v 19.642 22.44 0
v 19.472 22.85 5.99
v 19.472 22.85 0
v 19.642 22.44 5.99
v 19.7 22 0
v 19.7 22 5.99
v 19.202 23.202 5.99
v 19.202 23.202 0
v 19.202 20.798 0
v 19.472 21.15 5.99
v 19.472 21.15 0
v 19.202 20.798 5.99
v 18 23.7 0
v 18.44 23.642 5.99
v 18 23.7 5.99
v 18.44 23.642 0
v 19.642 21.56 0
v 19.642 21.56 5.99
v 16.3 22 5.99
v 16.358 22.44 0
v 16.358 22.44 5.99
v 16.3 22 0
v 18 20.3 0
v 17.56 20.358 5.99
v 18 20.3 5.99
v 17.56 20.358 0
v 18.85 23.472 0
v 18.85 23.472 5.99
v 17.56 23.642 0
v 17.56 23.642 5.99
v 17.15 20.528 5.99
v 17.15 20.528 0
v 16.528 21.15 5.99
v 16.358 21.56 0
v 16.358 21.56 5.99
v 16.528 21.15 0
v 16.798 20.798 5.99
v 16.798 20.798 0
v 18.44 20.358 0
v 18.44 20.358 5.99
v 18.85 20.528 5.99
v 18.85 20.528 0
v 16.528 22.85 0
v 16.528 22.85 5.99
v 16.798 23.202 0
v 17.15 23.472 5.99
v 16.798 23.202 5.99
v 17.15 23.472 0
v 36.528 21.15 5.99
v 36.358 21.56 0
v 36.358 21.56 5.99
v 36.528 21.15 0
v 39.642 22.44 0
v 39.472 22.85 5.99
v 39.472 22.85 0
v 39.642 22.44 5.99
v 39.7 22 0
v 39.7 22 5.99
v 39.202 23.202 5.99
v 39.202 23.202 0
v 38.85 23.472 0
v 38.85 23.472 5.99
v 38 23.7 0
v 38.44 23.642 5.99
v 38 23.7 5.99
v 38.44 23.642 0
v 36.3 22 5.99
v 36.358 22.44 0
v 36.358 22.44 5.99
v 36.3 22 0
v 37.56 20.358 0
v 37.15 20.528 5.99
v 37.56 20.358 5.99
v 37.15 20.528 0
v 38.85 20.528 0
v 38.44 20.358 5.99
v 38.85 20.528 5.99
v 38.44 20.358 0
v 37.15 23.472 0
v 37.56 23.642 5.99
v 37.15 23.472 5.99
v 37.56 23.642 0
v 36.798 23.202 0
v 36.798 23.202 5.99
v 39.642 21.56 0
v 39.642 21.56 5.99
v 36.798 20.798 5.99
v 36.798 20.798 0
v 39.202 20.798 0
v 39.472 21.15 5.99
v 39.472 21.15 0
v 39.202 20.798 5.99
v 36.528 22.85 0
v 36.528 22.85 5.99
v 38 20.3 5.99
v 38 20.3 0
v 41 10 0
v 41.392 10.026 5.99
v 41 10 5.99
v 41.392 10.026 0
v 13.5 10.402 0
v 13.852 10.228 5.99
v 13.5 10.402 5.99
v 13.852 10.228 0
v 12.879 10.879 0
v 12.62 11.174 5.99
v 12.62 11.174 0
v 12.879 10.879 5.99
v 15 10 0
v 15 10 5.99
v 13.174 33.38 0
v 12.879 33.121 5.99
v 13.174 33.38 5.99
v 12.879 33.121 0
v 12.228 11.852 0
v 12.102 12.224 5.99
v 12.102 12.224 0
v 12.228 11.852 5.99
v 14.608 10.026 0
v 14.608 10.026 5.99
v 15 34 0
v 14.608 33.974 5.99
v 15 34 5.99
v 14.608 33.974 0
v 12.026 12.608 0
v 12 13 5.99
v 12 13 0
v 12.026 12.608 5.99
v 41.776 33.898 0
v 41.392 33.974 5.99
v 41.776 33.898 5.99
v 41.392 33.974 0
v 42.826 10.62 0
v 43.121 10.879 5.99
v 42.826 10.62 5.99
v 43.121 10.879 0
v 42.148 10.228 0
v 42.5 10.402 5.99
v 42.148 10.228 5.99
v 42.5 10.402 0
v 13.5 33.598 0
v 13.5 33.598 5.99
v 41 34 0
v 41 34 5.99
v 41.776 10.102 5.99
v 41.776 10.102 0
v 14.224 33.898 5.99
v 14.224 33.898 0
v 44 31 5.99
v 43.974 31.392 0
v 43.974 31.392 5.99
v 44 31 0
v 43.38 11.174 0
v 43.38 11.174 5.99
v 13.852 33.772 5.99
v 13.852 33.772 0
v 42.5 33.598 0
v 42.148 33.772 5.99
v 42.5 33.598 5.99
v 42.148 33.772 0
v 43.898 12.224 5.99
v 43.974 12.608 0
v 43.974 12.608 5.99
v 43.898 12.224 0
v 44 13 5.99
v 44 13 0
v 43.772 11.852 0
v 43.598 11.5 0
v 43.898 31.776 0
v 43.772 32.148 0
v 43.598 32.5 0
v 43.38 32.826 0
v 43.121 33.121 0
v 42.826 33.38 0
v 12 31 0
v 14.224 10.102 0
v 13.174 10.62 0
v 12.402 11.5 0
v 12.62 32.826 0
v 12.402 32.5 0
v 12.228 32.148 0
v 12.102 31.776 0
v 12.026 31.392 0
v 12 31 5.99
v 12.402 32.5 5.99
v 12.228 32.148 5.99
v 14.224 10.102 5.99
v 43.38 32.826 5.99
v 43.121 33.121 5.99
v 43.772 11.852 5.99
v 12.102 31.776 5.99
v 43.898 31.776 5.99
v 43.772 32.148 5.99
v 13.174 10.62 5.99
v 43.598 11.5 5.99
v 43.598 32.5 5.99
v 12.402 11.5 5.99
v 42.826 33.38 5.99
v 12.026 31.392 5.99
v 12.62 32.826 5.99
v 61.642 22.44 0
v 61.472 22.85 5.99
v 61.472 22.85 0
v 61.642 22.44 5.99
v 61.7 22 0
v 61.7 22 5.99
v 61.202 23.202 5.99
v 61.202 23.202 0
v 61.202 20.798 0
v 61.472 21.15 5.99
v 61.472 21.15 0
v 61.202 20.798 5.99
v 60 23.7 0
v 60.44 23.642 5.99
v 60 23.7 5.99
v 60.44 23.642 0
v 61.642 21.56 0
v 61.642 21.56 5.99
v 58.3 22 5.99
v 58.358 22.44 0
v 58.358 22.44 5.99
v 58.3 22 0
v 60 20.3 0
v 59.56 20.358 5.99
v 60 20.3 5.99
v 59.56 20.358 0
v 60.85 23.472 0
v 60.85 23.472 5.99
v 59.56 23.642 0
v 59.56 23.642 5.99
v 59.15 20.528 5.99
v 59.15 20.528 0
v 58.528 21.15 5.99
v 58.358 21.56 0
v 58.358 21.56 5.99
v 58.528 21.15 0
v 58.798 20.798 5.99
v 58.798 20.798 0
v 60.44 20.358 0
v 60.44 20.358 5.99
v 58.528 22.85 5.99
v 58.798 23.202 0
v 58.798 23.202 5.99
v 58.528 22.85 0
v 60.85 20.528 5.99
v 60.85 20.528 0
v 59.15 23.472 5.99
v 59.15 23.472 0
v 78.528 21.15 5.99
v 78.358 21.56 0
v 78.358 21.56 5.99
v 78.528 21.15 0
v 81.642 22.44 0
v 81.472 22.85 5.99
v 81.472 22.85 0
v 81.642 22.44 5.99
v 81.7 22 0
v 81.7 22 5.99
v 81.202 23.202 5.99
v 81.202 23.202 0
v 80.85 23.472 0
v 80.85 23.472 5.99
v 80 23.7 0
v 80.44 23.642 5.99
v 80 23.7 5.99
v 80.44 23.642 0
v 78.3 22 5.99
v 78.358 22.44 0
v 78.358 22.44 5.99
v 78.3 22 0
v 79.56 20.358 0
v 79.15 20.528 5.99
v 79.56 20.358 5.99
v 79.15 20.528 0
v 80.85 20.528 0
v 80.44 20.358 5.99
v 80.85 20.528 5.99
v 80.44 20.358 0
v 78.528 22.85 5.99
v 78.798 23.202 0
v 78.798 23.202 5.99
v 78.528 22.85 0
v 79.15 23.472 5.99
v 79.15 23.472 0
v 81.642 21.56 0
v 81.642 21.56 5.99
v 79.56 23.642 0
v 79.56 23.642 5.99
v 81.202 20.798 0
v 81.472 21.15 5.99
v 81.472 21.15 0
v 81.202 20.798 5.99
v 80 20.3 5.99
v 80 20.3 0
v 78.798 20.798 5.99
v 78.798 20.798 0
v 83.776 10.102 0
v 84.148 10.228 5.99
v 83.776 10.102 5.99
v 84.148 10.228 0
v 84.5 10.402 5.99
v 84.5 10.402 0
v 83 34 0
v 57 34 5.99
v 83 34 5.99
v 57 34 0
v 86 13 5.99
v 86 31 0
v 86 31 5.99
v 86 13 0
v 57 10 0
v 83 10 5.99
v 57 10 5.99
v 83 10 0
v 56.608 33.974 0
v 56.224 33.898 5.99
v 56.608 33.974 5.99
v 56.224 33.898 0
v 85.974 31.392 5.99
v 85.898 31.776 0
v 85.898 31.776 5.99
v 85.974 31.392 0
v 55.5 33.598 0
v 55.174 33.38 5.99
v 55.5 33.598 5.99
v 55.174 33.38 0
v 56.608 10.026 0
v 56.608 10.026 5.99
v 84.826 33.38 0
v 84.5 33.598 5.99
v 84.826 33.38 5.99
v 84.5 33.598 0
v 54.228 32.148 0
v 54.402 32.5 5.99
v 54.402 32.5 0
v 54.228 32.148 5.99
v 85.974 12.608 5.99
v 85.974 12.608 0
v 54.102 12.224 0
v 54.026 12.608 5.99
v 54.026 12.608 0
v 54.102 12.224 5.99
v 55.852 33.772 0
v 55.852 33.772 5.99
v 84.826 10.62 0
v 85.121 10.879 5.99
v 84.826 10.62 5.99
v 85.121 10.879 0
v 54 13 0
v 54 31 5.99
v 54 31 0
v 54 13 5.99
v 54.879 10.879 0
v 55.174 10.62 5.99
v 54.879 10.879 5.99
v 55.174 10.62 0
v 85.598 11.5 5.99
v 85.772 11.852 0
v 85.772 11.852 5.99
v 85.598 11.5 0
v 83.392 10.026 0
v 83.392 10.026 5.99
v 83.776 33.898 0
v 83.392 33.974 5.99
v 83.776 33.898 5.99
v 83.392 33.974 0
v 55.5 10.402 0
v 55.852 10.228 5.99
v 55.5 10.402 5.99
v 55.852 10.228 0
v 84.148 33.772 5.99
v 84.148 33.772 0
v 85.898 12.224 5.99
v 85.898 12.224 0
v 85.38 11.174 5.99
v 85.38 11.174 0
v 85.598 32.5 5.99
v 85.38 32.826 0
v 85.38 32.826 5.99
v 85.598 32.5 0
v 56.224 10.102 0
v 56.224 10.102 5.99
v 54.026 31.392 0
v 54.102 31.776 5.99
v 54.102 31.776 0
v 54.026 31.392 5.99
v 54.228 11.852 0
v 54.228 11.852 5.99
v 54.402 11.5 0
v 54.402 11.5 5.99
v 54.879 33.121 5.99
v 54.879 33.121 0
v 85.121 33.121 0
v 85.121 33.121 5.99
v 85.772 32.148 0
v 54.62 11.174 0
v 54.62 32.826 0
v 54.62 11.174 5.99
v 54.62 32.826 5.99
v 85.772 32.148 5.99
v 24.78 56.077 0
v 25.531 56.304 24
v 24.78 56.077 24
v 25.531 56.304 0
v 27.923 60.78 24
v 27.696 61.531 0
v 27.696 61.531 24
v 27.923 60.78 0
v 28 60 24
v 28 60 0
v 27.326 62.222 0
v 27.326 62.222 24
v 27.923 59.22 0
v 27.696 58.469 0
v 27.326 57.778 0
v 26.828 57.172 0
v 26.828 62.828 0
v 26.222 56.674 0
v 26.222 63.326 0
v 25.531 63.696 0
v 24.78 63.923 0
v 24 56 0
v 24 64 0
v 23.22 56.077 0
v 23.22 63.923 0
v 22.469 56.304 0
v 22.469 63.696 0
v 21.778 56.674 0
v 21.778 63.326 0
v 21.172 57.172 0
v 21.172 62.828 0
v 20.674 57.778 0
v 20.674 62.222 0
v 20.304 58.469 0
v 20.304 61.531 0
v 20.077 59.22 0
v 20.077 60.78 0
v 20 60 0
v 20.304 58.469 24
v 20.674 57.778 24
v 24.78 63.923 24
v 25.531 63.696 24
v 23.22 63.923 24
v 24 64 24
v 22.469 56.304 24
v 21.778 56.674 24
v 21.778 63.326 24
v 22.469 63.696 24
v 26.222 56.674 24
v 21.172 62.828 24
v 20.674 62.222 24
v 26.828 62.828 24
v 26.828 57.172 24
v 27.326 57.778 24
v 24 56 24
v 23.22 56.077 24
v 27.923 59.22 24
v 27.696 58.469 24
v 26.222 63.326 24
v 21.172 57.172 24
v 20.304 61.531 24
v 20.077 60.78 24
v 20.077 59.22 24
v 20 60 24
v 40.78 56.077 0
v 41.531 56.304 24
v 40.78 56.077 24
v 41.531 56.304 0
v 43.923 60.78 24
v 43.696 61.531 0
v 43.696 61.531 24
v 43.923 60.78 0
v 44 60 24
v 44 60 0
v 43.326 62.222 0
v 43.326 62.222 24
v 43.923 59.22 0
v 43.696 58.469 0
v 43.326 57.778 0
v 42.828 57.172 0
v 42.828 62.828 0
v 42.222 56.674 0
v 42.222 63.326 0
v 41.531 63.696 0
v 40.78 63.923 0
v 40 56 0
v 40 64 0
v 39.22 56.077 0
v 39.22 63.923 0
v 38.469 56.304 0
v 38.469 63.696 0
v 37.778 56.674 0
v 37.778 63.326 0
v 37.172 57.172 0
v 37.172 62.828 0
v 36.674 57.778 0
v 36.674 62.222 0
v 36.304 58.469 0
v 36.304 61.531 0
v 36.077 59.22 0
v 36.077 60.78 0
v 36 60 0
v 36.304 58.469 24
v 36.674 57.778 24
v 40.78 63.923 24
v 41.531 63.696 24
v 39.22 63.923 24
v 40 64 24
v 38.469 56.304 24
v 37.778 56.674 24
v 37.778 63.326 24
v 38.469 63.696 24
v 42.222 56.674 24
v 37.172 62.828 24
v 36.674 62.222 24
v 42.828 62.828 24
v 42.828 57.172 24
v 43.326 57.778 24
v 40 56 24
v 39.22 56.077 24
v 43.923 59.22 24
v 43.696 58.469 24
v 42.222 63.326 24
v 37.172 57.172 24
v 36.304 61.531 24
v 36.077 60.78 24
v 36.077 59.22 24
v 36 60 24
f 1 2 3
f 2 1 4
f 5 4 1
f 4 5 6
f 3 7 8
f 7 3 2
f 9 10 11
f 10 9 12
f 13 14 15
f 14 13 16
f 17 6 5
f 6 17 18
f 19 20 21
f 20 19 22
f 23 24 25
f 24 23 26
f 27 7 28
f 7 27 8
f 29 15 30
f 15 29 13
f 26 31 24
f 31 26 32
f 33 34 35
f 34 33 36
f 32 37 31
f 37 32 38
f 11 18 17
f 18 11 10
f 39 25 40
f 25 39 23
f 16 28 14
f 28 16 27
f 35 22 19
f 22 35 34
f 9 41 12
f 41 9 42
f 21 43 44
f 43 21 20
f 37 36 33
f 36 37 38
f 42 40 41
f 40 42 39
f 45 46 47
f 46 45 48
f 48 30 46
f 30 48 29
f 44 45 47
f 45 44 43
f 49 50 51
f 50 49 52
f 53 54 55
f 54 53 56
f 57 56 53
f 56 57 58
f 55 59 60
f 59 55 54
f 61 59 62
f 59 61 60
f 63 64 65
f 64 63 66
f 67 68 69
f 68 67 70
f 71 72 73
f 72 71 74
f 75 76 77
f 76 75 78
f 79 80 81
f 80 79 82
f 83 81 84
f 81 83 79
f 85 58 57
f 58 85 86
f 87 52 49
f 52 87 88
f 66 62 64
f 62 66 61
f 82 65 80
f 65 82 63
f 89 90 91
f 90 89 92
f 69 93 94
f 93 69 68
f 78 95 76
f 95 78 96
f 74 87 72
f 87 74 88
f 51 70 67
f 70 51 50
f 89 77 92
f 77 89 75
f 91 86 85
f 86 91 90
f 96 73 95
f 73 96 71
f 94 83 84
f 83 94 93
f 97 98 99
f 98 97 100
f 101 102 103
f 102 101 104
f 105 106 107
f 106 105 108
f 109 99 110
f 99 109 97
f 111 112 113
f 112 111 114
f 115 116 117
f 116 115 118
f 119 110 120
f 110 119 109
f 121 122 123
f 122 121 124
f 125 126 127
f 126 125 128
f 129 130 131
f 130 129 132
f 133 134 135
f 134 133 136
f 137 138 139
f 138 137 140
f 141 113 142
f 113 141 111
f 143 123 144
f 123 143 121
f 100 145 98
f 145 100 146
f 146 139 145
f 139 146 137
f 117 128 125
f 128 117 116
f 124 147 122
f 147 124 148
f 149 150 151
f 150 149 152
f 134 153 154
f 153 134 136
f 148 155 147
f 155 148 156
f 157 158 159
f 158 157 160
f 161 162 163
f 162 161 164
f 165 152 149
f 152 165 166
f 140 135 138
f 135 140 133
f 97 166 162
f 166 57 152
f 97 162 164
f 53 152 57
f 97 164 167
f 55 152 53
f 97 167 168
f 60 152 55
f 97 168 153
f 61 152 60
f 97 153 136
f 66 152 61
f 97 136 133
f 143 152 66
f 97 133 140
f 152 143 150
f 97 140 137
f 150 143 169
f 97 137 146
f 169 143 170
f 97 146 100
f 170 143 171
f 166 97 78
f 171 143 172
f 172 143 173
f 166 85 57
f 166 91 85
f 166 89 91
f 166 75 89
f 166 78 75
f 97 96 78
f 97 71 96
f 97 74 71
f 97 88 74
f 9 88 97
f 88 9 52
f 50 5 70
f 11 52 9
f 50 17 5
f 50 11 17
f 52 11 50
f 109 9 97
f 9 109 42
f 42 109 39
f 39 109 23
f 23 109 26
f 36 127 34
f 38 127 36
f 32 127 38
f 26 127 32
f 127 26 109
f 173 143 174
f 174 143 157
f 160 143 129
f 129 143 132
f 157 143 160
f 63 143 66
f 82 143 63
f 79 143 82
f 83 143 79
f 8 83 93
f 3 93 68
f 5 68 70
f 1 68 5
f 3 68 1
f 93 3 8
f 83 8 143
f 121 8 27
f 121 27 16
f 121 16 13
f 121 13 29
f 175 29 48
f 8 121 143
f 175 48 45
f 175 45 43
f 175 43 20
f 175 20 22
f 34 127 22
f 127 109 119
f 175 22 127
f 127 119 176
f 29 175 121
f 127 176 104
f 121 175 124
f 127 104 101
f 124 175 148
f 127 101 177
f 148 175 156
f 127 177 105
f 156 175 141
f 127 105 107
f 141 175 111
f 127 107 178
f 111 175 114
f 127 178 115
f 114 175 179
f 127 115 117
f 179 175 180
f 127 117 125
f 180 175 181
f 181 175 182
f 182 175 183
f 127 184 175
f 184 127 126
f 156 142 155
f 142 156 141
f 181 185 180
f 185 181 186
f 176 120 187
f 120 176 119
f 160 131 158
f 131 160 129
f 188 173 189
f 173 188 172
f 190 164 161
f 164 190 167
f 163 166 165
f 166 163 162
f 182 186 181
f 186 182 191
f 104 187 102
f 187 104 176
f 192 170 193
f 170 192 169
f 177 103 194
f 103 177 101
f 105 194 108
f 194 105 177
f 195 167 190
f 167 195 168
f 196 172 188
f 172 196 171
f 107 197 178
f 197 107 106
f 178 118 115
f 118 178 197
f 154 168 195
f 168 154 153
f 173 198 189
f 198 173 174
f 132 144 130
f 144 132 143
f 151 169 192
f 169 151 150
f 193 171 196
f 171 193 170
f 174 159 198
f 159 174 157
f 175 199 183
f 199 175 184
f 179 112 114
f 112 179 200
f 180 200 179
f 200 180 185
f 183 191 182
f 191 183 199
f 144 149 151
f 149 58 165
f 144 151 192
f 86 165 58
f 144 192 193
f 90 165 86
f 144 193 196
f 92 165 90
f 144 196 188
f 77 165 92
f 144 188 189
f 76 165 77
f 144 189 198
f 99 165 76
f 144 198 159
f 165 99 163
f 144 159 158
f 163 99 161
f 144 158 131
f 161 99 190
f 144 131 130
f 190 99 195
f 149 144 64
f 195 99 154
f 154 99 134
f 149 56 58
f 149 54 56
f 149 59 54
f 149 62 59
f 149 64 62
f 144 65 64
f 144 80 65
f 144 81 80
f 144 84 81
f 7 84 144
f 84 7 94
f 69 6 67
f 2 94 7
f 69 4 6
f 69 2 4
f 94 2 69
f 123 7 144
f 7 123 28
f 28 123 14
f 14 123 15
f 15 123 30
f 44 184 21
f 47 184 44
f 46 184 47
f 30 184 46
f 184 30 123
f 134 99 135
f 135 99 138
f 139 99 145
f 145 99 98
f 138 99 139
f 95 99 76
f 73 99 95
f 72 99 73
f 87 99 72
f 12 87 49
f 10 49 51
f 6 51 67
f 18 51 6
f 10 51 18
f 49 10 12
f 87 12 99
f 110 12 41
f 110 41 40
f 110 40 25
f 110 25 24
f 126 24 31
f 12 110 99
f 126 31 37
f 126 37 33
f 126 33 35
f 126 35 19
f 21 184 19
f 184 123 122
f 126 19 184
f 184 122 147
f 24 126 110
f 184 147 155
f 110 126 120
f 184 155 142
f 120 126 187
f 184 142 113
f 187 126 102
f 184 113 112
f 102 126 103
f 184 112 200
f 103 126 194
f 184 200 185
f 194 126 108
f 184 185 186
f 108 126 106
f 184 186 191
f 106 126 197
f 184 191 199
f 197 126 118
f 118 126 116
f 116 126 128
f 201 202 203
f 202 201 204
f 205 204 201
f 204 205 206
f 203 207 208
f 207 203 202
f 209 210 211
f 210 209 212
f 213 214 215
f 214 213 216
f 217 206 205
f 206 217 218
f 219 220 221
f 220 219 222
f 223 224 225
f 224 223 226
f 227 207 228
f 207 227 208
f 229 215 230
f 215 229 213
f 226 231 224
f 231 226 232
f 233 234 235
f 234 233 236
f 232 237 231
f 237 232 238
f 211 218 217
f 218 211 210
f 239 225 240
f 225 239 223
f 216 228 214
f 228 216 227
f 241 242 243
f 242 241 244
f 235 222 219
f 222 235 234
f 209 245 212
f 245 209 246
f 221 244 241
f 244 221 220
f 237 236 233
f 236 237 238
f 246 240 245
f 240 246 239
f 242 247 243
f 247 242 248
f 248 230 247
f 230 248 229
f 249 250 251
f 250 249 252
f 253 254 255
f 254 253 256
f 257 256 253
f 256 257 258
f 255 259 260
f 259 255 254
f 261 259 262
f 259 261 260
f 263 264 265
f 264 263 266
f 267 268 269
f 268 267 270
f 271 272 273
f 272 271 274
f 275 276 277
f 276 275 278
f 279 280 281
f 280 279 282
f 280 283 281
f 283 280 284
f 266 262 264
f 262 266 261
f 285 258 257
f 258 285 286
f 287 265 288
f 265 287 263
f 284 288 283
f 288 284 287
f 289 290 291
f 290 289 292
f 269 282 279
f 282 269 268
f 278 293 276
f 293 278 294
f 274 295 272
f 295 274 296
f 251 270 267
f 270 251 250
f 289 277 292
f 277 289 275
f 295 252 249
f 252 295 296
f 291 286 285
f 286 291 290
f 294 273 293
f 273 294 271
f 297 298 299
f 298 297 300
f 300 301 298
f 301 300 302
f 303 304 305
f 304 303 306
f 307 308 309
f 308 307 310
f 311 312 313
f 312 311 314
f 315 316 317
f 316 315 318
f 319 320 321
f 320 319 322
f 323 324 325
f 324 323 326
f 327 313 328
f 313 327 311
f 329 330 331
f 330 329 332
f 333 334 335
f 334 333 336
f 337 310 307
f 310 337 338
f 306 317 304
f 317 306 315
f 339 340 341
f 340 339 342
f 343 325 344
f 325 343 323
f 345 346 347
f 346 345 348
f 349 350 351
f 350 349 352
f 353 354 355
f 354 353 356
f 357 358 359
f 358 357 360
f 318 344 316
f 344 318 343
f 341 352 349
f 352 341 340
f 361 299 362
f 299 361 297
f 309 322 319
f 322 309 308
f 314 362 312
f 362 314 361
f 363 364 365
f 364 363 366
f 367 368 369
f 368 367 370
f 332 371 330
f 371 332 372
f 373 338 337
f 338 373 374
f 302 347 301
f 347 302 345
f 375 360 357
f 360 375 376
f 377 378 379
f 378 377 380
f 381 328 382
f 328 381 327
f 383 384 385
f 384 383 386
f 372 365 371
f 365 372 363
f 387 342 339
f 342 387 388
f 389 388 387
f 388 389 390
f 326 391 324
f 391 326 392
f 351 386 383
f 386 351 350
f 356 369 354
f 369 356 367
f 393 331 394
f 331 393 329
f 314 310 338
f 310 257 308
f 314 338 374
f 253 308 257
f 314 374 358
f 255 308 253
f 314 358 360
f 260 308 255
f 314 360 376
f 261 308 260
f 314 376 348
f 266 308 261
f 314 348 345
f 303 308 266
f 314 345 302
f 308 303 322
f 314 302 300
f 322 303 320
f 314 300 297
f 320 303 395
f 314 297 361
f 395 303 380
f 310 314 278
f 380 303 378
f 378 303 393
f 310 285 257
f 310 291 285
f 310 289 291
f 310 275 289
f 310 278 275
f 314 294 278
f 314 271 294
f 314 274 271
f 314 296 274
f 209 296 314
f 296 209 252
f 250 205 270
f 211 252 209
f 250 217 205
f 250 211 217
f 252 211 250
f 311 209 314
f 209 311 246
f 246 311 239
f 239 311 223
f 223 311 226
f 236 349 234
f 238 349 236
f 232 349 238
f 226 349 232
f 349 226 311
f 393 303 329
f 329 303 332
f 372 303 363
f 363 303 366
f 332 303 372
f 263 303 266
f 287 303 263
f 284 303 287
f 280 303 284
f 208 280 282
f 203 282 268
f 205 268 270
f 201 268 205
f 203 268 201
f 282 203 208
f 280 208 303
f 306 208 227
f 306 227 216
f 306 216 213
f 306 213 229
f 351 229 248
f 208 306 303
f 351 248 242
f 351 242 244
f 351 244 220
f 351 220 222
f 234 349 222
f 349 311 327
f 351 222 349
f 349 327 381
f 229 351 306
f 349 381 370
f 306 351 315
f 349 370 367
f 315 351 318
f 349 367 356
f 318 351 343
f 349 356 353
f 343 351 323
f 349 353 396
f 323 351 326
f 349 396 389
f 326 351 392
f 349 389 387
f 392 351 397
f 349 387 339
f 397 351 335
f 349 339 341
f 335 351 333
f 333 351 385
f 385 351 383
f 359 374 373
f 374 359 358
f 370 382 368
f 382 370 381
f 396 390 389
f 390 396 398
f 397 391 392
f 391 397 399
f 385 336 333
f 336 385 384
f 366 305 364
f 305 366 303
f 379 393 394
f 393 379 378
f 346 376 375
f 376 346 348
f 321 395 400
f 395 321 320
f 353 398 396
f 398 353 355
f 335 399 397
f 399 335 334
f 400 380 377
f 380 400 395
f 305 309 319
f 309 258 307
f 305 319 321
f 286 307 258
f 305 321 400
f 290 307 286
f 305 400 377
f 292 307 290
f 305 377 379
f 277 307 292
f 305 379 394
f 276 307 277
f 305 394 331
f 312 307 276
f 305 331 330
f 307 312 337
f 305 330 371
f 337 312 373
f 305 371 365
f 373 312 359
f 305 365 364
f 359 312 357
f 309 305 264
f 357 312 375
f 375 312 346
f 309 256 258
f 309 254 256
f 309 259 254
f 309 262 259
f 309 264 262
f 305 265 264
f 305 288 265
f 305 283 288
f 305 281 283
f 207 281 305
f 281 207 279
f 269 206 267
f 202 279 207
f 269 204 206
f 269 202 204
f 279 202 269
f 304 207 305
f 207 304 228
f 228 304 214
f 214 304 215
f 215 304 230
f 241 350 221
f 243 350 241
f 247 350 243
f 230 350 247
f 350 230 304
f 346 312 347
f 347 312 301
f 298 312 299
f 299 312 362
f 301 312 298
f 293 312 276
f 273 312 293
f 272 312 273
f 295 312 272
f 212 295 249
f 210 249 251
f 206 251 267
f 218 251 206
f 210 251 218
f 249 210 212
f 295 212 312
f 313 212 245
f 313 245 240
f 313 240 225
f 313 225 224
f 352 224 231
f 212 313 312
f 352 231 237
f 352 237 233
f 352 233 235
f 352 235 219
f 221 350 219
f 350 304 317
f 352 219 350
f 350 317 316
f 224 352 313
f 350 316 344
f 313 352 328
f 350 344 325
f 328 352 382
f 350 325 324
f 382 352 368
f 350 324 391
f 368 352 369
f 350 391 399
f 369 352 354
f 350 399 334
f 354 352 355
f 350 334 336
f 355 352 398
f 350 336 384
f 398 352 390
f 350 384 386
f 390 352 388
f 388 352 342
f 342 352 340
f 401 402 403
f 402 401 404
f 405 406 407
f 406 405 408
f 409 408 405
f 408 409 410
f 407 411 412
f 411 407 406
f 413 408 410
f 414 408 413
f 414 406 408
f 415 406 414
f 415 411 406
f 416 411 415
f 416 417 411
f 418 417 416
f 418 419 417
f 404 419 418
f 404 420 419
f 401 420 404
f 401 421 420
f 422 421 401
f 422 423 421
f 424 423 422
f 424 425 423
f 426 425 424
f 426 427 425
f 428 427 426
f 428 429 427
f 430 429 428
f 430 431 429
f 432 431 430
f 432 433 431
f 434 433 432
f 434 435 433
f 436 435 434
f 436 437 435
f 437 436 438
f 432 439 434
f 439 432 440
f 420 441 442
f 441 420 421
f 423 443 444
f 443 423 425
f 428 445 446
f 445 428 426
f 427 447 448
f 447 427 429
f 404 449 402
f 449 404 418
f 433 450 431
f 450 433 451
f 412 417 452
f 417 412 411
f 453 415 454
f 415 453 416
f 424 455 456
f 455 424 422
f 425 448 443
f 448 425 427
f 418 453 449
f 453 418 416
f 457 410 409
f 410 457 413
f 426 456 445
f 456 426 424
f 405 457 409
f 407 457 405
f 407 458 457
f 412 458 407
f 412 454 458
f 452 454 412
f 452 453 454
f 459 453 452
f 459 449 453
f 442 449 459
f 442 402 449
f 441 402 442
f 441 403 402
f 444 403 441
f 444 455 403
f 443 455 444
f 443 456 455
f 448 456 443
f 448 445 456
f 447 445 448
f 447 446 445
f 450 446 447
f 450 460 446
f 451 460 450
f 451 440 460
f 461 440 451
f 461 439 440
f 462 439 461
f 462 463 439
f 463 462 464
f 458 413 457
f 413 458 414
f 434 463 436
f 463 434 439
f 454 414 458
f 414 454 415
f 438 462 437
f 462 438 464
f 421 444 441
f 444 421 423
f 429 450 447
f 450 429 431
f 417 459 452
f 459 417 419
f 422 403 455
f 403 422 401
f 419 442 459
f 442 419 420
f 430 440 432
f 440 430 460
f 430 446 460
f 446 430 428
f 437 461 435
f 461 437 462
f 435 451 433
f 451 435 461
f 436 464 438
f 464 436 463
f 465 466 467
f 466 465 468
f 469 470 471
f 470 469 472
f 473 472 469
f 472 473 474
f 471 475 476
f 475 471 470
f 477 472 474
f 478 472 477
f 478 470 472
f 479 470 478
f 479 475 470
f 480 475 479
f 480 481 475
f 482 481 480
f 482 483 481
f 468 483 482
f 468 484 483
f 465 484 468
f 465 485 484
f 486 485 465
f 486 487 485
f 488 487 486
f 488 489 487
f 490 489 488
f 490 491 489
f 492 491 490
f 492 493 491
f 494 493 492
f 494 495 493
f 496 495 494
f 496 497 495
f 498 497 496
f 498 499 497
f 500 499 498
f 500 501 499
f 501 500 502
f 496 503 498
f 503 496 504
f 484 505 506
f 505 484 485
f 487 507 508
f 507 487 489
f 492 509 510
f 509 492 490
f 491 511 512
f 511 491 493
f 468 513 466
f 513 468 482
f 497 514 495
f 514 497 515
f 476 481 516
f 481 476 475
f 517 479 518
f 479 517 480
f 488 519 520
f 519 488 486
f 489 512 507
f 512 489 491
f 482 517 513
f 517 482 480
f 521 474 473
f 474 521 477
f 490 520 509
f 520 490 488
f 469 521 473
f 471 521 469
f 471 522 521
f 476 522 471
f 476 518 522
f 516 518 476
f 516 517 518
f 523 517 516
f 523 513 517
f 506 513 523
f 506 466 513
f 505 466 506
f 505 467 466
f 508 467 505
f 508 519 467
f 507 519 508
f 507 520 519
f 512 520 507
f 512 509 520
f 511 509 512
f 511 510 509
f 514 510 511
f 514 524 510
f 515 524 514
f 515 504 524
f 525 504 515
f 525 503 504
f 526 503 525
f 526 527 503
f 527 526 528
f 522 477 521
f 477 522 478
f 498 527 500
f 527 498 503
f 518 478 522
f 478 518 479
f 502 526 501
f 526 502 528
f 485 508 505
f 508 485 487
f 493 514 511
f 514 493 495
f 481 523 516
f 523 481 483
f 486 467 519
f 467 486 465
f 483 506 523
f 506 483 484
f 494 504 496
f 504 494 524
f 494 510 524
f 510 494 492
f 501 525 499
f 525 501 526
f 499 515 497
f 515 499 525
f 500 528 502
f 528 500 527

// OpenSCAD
/*
Sample 112: Geteilte Wellen-Klemmkupplung — 8-mm-Welle
Generated from the FDM Mechanical Sample Library.
Units: millimetres.

Override examples:
  openscad -o custom.stl -D 'view="plate"' -D 'render_fn=64' model.scad
  openscad -o preview.png -D 'view="assembly"' model.scad
*/
use <../../../library/fdm_mechanisms.scad>

render_fn = is_undef(render_fn) ? 48 : render_fn;
view = is_undef(view) ? "plate" : view;
$fn = render_fn;

sample_shaft_coupler(
    view=view,
    bore_d=8,
    clearance=0.25,
    screw_d=3.4,
    nut_flat=5.7
);
